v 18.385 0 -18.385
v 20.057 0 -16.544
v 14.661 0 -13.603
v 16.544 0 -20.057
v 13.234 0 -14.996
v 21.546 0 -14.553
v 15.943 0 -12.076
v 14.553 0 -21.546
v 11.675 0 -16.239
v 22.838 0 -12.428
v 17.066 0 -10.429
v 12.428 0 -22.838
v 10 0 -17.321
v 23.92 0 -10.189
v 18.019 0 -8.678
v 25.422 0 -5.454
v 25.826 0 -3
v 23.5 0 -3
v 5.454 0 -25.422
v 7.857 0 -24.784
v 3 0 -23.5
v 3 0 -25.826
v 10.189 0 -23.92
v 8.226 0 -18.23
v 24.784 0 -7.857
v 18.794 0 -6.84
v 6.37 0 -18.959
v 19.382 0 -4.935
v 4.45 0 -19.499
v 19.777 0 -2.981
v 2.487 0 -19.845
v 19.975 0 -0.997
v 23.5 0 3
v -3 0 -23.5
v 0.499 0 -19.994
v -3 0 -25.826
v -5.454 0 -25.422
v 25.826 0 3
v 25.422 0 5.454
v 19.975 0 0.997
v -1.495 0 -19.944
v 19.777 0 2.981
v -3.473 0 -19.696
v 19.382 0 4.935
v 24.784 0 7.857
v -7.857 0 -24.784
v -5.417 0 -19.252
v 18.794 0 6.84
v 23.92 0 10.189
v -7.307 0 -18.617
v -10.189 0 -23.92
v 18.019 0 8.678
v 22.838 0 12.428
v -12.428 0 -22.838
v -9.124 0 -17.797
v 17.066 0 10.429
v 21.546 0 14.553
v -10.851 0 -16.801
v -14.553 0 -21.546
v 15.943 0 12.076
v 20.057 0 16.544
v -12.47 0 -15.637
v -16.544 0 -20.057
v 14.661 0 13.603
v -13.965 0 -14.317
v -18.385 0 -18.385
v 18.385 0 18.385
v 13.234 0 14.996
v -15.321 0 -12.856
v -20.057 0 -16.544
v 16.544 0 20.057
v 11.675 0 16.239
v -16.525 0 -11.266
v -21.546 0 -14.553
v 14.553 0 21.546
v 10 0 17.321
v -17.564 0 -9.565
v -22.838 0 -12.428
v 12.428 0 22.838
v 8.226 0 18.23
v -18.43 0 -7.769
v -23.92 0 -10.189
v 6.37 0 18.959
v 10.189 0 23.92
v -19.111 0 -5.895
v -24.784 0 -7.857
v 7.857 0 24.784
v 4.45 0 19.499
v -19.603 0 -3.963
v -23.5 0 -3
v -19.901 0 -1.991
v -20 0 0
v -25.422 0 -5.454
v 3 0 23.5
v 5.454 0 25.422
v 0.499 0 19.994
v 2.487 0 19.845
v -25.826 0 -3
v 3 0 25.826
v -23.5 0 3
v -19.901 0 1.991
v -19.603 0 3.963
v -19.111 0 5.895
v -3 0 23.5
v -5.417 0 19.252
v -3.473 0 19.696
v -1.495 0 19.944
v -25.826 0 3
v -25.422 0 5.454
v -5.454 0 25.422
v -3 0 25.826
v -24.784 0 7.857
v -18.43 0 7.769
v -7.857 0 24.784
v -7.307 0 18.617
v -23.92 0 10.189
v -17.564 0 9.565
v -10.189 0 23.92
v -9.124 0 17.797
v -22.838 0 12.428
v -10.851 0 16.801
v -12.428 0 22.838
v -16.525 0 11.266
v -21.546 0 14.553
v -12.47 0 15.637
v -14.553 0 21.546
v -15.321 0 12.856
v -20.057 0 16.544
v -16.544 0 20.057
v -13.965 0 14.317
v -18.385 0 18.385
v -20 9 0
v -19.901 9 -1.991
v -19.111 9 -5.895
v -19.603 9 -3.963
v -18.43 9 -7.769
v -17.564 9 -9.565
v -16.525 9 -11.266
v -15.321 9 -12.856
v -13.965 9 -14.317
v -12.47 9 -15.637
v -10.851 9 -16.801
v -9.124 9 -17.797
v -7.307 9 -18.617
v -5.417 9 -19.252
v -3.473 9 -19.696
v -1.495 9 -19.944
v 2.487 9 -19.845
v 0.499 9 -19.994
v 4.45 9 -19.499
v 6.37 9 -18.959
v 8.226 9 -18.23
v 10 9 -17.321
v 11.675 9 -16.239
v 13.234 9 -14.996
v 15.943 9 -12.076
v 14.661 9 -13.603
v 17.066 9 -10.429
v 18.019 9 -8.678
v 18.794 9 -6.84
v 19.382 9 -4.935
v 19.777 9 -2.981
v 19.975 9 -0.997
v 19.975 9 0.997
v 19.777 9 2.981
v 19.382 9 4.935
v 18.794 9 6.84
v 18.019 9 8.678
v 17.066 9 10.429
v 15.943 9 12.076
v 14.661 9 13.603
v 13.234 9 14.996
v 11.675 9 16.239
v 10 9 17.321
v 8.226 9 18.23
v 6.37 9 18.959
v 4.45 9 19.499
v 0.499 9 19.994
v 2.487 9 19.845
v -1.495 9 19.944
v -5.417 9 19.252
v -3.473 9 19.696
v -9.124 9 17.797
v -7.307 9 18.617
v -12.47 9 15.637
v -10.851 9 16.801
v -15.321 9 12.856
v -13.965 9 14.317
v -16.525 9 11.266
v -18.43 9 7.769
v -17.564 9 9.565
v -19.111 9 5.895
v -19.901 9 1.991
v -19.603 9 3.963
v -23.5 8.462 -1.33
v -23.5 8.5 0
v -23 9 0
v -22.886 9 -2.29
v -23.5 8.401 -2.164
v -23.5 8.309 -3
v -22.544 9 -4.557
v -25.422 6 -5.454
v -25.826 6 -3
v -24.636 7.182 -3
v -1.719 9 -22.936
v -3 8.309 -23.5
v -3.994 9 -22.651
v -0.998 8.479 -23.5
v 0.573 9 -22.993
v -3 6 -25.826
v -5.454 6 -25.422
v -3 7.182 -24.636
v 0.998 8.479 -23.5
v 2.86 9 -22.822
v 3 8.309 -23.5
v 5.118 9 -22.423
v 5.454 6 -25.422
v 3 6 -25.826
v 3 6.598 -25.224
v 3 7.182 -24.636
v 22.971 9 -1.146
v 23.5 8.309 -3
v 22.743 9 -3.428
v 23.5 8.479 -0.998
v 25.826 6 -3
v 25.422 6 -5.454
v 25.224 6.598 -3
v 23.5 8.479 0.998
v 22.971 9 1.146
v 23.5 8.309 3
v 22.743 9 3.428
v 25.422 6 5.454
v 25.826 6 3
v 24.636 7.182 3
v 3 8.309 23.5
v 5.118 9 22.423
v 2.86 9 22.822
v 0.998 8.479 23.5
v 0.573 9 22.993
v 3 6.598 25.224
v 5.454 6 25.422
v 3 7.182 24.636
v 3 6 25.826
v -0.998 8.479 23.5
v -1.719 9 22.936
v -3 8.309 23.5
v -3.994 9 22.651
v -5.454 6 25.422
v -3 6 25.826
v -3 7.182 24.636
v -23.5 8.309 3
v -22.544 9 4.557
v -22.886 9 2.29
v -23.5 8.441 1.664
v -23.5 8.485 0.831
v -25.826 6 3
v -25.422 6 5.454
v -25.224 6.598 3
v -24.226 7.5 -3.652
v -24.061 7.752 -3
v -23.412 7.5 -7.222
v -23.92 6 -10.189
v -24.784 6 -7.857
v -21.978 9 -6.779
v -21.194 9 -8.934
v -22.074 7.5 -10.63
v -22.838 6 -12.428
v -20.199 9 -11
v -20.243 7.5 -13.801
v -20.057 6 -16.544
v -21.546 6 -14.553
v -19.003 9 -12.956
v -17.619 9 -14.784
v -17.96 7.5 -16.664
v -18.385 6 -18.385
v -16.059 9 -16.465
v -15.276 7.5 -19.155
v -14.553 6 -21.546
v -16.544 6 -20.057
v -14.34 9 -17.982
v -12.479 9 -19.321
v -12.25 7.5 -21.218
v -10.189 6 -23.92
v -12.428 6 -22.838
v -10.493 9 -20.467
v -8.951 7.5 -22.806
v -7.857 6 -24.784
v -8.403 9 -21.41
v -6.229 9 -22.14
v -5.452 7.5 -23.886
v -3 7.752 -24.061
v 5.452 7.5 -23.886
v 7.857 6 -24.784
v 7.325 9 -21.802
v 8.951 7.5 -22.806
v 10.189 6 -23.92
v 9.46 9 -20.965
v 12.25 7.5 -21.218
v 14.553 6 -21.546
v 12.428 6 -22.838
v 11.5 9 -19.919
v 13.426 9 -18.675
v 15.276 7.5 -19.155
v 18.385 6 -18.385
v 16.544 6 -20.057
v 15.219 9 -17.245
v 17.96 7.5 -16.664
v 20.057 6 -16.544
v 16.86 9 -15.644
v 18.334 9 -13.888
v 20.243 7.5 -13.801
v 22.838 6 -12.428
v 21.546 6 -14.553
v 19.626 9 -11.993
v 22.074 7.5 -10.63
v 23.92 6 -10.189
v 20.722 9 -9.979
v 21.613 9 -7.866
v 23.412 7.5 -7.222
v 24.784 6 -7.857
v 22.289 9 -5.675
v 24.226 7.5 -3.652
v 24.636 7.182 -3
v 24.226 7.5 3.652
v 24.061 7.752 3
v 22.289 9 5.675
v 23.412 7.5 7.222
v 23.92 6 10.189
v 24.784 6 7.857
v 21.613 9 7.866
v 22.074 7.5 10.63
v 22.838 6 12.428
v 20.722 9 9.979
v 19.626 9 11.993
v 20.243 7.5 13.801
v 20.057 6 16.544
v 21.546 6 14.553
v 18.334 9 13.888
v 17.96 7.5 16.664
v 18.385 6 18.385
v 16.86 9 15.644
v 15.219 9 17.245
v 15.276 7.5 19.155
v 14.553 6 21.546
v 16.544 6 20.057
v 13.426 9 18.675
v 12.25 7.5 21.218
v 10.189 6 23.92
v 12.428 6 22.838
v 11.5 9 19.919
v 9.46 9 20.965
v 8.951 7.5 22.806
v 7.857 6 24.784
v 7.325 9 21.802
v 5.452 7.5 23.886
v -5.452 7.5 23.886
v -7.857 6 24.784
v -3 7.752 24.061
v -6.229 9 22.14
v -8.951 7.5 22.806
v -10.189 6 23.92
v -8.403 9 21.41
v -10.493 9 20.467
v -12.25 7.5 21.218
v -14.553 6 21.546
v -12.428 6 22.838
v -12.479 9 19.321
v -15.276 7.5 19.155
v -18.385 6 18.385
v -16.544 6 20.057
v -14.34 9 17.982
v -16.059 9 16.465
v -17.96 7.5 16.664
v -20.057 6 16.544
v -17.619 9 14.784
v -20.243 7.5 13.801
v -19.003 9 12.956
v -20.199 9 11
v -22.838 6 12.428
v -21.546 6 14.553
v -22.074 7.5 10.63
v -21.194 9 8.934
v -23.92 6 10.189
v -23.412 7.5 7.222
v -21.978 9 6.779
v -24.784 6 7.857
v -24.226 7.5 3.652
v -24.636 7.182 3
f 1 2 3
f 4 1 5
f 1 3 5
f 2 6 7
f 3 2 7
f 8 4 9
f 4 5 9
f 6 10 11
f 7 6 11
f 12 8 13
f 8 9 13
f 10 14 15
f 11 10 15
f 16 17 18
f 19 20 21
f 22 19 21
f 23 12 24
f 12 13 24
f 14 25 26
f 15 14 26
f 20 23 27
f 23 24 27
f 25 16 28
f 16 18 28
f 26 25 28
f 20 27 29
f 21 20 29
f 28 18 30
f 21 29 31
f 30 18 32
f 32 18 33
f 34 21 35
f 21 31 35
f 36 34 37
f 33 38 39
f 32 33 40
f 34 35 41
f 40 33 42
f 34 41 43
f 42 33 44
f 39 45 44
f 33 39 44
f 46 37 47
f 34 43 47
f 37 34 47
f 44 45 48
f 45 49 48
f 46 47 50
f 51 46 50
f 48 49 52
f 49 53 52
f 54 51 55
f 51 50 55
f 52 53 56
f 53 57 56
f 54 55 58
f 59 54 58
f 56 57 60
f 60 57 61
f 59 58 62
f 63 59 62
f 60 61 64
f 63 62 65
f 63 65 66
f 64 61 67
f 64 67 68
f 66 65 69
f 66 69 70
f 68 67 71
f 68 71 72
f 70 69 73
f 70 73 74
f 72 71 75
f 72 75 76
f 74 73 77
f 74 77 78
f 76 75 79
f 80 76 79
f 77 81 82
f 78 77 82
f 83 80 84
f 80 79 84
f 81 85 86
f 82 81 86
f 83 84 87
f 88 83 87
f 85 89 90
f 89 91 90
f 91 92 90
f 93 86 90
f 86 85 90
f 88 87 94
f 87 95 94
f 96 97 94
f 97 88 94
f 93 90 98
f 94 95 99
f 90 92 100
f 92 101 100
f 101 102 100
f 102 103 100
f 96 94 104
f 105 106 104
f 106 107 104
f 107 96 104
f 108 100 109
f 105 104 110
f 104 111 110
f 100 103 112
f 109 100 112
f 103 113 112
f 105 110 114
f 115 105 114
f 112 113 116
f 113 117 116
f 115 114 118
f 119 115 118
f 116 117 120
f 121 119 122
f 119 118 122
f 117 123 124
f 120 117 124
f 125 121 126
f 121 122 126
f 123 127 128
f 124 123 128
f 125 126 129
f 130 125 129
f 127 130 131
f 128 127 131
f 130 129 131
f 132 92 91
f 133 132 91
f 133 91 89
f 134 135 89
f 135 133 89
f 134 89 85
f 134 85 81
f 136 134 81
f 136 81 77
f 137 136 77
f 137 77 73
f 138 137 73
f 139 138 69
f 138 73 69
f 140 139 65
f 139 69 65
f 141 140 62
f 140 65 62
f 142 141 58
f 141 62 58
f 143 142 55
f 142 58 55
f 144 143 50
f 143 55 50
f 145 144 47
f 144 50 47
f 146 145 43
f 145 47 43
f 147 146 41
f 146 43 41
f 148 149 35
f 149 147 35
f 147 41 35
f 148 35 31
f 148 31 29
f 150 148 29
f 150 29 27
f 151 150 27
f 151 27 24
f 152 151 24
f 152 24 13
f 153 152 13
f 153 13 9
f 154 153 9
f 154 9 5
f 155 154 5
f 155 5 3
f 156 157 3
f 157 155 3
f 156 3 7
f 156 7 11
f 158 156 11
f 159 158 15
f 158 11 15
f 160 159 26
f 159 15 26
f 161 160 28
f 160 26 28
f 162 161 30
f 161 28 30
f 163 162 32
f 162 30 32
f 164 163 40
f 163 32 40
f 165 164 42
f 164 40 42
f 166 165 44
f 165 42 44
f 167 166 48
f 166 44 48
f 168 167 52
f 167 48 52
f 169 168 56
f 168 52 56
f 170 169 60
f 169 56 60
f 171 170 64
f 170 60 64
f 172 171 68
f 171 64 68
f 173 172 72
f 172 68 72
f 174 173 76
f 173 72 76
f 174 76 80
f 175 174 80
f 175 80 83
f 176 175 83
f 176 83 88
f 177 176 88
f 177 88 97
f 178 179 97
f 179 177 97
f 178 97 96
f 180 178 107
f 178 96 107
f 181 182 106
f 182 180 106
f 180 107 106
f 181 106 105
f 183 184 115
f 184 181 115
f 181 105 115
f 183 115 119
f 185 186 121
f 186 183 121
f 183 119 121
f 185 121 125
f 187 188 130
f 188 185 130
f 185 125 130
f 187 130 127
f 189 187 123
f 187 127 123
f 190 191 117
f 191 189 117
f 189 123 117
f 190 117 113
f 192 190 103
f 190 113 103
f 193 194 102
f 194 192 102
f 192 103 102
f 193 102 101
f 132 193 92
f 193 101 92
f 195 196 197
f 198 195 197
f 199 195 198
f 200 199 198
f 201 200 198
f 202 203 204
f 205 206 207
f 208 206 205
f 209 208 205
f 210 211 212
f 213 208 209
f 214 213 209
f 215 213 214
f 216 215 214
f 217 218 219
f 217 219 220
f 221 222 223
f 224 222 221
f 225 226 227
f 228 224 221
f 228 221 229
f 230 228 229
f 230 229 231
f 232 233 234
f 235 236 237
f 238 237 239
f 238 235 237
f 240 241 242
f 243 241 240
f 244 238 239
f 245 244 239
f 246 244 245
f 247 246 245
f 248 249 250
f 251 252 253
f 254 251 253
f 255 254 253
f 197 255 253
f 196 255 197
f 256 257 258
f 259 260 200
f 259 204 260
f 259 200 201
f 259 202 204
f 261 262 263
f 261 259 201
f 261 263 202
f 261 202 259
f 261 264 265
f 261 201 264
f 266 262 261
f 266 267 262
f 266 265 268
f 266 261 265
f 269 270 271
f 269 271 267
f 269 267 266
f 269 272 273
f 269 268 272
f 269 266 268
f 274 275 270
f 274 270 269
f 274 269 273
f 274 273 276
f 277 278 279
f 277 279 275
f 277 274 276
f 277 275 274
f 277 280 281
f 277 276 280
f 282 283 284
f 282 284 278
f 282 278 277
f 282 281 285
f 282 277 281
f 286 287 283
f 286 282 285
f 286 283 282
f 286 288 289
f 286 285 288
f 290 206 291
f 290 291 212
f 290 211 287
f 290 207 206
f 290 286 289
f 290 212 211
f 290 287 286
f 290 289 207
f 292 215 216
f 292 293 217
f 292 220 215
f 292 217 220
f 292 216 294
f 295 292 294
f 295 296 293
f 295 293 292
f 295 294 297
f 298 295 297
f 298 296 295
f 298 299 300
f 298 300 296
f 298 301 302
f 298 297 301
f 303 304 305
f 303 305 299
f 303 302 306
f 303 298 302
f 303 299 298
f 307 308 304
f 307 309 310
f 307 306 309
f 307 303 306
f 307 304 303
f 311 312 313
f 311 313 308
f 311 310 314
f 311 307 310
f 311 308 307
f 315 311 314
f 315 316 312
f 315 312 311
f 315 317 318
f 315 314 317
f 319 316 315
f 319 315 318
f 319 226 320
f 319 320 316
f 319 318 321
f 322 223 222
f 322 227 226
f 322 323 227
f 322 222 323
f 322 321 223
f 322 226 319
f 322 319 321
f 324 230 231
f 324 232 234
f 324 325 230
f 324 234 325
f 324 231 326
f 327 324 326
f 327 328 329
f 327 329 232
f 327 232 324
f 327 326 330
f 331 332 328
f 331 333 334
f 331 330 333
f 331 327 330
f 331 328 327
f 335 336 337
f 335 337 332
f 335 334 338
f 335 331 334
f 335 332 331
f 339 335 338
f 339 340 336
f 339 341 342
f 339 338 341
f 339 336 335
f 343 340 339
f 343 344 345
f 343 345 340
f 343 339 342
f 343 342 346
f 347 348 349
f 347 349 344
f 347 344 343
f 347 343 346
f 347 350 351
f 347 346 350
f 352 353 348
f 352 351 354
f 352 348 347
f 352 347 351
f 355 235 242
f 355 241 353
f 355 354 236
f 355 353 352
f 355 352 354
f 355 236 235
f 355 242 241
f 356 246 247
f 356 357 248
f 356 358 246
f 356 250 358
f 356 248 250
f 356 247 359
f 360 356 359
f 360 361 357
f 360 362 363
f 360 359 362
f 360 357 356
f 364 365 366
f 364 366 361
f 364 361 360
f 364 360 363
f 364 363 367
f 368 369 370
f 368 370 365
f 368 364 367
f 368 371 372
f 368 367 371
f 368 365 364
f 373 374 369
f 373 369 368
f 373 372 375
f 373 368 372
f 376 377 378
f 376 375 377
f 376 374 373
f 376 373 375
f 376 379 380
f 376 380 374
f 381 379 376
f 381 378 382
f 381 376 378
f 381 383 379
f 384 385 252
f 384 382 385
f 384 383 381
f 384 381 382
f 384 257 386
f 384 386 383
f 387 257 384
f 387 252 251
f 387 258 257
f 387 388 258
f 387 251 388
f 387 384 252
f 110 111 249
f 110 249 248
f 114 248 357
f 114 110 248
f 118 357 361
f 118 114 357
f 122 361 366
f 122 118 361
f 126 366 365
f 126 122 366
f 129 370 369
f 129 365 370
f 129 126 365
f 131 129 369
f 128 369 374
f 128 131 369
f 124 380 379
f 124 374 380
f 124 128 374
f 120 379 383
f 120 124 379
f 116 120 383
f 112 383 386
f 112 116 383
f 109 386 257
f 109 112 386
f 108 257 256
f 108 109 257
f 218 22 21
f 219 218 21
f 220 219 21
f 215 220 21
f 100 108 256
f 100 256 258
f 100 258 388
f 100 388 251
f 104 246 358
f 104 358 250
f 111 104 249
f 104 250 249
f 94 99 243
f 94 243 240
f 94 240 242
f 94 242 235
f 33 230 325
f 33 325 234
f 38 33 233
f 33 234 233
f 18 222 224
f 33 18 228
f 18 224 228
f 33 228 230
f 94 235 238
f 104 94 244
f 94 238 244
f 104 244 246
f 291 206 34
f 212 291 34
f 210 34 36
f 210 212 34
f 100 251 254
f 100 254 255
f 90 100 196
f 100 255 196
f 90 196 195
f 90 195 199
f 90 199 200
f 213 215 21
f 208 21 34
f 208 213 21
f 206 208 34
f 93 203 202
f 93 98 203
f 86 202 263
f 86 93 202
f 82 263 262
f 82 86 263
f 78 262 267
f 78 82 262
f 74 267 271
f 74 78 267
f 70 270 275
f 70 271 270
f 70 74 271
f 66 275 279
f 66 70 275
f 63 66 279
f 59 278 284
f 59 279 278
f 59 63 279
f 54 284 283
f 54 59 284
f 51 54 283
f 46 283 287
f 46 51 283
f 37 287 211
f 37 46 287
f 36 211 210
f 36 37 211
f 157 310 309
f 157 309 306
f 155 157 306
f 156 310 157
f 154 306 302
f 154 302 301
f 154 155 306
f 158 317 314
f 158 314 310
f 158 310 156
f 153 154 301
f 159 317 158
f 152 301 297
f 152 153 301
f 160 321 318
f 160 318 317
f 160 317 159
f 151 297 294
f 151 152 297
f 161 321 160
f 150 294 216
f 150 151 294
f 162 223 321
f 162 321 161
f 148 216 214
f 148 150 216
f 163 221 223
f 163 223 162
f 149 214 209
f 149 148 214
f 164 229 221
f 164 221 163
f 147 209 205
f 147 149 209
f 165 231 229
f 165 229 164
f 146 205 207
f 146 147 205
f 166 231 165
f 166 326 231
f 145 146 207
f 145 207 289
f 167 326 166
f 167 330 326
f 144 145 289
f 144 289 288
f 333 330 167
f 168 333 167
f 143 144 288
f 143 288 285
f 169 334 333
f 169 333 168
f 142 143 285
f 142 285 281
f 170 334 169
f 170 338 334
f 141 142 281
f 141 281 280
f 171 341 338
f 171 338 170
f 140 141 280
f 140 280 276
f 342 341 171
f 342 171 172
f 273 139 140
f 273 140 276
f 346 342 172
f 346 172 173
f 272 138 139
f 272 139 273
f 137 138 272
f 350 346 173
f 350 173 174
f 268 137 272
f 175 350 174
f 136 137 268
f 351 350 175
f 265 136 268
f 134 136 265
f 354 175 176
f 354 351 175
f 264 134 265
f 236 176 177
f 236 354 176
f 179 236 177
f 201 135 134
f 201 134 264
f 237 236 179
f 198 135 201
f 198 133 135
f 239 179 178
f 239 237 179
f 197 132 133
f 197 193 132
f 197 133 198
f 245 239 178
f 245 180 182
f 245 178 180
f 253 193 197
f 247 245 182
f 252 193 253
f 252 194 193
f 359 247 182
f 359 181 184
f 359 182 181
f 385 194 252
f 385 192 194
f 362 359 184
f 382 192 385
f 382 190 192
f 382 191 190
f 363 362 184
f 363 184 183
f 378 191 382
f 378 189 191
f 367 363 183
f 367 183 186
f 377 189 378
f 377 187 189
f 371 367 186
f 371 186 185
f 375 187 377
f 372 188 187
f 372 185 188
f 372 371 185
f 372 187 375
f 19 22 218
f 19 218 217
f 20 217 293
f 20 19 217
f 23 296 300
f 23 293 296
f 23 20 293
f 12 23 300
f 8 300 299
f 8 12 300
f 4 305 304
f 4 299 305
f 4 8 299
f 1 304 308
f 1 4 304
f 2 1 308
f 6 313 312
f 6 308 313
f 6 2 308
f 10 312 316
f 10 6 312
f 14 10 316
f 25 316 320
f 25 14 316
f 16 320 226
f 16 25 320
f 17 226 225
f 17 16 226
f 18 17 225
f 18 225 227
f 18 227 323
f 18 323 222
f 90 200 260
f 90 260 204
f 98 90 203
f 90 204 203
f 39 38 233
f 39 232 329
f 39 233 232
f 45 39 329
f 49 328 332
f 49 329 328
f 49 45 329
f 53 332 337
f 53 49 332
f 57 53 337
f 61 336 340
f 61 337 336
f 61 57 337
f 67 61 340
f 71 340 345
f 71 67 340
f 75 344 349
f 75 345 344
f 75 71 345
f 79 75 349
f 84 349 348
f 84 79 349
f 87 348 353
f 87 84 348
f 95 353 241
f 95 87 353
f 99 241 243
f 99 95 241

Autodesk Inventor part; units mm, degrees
sketch "Skizze1" plane through (0, 0, 0) normal (0, 1, 0) x (-1, 0, 0)
  circle A0 centre (0, 0) radius 20
  circle A1 centre (0, 0) radius 26
  dimension "d0" = 40
  dimension "d1" = 52
extrude "Extrusion1" add sketch "Skizze1" along normal blind 9
chamfer "Fase1" distance 3 angle 45 1 edges at (26, 9, 0)
sketch "Skizze2" plane through (0, 9, 0) normal (0, 1, 0) x (1, 0, 0)
  line L0 (-28.5, -3) -> (-23.5, -3)
  line L1 (-23.5, -3) -> (-23.5, 3)
  line L2 (-23.5, 3) -> (-28.5, 3)
  line L3 (-28.5, 3) -> (-28.5, -3)
  circle A0 centre (0, 0) radius 26 projected
  line L4 (-28.5, -3) -> (-23.5, 3) construction
  line L5 (-23.5, -3) -> (-28.5, 3) construction
  line L6 (3, 23.5) -> (-3, 23.5)
  line L7 (-3, 23.5) -> (-3, 28.5)
  line L8 (-3, 28.5) -> (3, 28.5)
  line L9 (3, 28.5) -> (3, 23.5)
  line L10 (3, 23.5) -> (-3, 28.5) construction
  line L11 (-3, 23.5) -> (3, 28.5) construction
  line L12 (3, -23.5) -> (-3, -23.5)
  line L13 (-3, -23.5) -> (-3, -28.5)
  line L14 (-3, -28.5) -> (3, -28.5)
  line L15 (3, -28.5) -> (3, -23.5)
  line L16 (3, -23.5) -> (-3, -28.5) construction
  line L17 (-3, -23.5) -> (3, -28.5) construction
  line L18 (23.5, -3) -> (28.5, -3)
  line L19 (28.5, -3) -> (28.5, 3)
  line L20 (28.5, 3) -> (23.5, 3)
  line L21 (23.5, 3) -> (23.5, -3)
  line L22 (23.5, -3) -> (28.5, 3) construction
  line L23 (28.5, -3) -> (23.5, 3) construction
  line L24 (-39.9, 0) -> (39.9, 0) projected
  point P0 (-26, 0)
  point P1 (0, 26)
  point P2 (0, -26)
  point P3 (26, 0)
  dimension "d7" = 5
  dimension "d8" = 6
  dimension "d9" = 5
  dimension "d10" = 26
  dimension "d11" = 6
  dimension "d12" = 0
  dimension "d13" = 6
  dimension "d14" = 5
  dimension "d15" = 5
  dimension "d16" = 0
extrude "Extrusion2" cut sketch "Skizze2" against normal blind 9 contours L3 L24 A0 L0 | A0 L24 L1 L0 | L3 L2 A0 L24 | A0 L2 L1 L24 | L13 L12 L15 A0 | A0 L15 L14 L13 | L24 A0 L18 L21 | L21 L20 A0 L24 | L7 L8 L9 A0 | A0 L9 L6 L7 | A0 L24 L19 L18 | A0 L20 L19 L24
thread "Gewinde1" size "M40x1.5" class "6H" standard "ANSI Metric M Profile" full length
properties part number "Sicherheitsmutter_m40"
